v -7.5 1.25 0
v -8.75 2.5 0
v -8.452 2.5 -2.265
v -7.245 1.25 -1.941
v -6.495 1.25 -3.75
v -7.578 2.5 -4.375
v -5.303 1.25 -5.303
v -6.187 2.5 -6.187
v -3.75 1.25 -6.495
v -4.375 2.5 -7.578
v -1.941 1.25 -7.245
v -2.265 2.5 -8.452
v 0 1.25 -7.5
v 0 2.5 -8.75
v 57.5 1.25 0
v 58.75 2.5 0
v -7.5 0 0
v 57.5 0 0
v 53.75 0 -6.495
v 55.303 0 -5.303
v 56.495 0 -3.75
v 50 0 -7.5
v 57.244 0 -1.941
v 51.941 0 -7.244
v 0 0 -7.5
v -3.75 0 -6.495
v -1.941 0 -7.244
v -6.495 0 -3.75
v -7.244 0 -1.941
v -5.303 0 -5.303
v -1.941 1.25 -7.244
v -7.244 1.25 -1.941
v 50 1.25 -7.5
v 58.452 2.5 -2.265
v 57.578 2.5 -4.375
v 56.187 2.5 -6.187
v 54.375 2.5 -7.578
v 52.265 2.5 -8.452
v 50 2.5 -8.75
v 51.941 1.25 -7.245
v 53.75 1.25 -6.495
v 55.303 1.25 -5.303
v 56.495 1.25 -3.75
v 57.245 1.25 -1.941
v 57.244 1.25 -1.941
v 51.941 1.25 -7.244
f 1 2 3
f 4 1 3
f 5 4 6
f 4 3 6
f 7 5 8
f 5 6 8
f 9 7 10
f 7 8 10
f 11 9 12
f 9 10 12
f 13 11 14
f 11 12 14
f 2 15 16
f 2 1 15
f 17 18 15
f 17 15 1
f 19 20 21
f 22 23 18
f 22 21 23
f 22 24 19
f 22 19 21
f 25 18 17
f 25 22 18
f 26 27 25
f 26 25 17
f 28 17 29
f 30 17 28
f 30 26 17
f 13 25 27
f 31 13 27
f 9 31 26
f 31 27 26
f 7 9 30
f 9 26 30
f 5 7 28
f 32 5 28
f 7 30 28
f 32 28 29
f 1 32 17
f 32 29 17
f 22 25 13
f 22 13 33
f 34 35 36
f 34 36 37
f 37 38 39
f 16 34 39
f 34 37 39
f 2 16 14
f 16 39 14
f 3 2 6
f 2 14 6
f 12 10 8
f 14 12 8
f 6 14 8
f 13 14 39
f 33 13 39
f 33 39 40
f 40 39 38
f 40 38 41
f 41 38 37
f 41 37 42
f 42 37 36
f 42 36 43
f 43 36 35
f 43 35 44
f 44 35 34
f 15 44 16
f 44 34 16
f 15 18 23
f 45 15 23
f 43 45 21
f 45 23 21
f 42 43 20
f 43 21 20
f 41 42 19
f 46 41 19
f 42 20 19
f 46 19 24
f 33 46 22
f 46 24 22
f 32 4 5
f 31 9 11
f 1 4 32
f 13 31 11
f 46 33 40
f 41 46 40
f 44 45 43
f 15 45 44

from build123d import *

# Parameters (mm, degrees)
BOSS_EXTRUDE1_DEPTH = 2.5
SKETCH3_W           = 50
SKETCH3_H           = 1.25
CUT_EXTRUDE2_DEPTH  = 1.25
CHAMFER2_SIZE       = 1.25


with BuildPart() as part:
    # Sketch1 → Boss-Extrude1 (new body)
    with BuildSketch(Plane(origin=(0, 0, 0), x_dir=(1, 0, 0), z_dir=(0, 1, 0))):
        with BuildLine():
            Line((0, 0), (-8.75, 0))
            ThreePointArc((-8.75, 0), (-6.187184335, 6.187184335), (0, 8.75))
            Line((0, 8.75), (50, 8.75))
            ThreePointArc((50, 8.75), (56.187184335, 6.187184335), (58.75, 0))
            Line((58.75, 0), (50, 0))
            Line((50, 0), (0, 0))
        make_face()
    extrude(amount=BOSS_EXTRUDE1_DEPTH)

    # Sketch3 → Cut-Extrude2 (cut)
    with BuildSketch(Plane.XZ):
        with BuildLine():
            Line((58.75, 0), (57.5, 0))
            ThreePointArc((57.5, 0), (55.303300859, -5.303300859), (50, -7.5))
            Line((50, -7.5), (50, -8.75))
            ThreePointArc((50, -8.75), (56.187184335, -6.187184335), (58.75, 0))
        make_face()
        with Locations((25, -8.125)):
            Rectangle(SKETCH3_W, SKETCH3_H)
        with BuildLine():
            Line((-7.5, 0), (-8.75, 0))
            ThreePointArc((-8.75, 0), (-6.187184335, -6.187184335), (0, -8.75))
            Line((0, -8.75), (0, -7.5))
            ThreePointArc((0, -7.5), (-5.303300859, -5.303300859), (-7.5, 0))
        make_face()
    extrude(amount=-CUT_EXTRUDE2_DEPTH, mode=Mode.SUBTRACT)

    # Chamfer2
    chamfer2_edges = [part.edges().sort_by_distance(p)[0] for p in [
        (56.187184335, 1.25, -6.187184335),
        (25, 1.25, -8.75),
        (-6.187184335, 1.25, -6.187184335),
    ]]
    chamfer(chamfer2_edges, length=CHAMFER2_SIZE - 0.0001)  # a hair under: the kernel refuses the full size


solid = part.part
